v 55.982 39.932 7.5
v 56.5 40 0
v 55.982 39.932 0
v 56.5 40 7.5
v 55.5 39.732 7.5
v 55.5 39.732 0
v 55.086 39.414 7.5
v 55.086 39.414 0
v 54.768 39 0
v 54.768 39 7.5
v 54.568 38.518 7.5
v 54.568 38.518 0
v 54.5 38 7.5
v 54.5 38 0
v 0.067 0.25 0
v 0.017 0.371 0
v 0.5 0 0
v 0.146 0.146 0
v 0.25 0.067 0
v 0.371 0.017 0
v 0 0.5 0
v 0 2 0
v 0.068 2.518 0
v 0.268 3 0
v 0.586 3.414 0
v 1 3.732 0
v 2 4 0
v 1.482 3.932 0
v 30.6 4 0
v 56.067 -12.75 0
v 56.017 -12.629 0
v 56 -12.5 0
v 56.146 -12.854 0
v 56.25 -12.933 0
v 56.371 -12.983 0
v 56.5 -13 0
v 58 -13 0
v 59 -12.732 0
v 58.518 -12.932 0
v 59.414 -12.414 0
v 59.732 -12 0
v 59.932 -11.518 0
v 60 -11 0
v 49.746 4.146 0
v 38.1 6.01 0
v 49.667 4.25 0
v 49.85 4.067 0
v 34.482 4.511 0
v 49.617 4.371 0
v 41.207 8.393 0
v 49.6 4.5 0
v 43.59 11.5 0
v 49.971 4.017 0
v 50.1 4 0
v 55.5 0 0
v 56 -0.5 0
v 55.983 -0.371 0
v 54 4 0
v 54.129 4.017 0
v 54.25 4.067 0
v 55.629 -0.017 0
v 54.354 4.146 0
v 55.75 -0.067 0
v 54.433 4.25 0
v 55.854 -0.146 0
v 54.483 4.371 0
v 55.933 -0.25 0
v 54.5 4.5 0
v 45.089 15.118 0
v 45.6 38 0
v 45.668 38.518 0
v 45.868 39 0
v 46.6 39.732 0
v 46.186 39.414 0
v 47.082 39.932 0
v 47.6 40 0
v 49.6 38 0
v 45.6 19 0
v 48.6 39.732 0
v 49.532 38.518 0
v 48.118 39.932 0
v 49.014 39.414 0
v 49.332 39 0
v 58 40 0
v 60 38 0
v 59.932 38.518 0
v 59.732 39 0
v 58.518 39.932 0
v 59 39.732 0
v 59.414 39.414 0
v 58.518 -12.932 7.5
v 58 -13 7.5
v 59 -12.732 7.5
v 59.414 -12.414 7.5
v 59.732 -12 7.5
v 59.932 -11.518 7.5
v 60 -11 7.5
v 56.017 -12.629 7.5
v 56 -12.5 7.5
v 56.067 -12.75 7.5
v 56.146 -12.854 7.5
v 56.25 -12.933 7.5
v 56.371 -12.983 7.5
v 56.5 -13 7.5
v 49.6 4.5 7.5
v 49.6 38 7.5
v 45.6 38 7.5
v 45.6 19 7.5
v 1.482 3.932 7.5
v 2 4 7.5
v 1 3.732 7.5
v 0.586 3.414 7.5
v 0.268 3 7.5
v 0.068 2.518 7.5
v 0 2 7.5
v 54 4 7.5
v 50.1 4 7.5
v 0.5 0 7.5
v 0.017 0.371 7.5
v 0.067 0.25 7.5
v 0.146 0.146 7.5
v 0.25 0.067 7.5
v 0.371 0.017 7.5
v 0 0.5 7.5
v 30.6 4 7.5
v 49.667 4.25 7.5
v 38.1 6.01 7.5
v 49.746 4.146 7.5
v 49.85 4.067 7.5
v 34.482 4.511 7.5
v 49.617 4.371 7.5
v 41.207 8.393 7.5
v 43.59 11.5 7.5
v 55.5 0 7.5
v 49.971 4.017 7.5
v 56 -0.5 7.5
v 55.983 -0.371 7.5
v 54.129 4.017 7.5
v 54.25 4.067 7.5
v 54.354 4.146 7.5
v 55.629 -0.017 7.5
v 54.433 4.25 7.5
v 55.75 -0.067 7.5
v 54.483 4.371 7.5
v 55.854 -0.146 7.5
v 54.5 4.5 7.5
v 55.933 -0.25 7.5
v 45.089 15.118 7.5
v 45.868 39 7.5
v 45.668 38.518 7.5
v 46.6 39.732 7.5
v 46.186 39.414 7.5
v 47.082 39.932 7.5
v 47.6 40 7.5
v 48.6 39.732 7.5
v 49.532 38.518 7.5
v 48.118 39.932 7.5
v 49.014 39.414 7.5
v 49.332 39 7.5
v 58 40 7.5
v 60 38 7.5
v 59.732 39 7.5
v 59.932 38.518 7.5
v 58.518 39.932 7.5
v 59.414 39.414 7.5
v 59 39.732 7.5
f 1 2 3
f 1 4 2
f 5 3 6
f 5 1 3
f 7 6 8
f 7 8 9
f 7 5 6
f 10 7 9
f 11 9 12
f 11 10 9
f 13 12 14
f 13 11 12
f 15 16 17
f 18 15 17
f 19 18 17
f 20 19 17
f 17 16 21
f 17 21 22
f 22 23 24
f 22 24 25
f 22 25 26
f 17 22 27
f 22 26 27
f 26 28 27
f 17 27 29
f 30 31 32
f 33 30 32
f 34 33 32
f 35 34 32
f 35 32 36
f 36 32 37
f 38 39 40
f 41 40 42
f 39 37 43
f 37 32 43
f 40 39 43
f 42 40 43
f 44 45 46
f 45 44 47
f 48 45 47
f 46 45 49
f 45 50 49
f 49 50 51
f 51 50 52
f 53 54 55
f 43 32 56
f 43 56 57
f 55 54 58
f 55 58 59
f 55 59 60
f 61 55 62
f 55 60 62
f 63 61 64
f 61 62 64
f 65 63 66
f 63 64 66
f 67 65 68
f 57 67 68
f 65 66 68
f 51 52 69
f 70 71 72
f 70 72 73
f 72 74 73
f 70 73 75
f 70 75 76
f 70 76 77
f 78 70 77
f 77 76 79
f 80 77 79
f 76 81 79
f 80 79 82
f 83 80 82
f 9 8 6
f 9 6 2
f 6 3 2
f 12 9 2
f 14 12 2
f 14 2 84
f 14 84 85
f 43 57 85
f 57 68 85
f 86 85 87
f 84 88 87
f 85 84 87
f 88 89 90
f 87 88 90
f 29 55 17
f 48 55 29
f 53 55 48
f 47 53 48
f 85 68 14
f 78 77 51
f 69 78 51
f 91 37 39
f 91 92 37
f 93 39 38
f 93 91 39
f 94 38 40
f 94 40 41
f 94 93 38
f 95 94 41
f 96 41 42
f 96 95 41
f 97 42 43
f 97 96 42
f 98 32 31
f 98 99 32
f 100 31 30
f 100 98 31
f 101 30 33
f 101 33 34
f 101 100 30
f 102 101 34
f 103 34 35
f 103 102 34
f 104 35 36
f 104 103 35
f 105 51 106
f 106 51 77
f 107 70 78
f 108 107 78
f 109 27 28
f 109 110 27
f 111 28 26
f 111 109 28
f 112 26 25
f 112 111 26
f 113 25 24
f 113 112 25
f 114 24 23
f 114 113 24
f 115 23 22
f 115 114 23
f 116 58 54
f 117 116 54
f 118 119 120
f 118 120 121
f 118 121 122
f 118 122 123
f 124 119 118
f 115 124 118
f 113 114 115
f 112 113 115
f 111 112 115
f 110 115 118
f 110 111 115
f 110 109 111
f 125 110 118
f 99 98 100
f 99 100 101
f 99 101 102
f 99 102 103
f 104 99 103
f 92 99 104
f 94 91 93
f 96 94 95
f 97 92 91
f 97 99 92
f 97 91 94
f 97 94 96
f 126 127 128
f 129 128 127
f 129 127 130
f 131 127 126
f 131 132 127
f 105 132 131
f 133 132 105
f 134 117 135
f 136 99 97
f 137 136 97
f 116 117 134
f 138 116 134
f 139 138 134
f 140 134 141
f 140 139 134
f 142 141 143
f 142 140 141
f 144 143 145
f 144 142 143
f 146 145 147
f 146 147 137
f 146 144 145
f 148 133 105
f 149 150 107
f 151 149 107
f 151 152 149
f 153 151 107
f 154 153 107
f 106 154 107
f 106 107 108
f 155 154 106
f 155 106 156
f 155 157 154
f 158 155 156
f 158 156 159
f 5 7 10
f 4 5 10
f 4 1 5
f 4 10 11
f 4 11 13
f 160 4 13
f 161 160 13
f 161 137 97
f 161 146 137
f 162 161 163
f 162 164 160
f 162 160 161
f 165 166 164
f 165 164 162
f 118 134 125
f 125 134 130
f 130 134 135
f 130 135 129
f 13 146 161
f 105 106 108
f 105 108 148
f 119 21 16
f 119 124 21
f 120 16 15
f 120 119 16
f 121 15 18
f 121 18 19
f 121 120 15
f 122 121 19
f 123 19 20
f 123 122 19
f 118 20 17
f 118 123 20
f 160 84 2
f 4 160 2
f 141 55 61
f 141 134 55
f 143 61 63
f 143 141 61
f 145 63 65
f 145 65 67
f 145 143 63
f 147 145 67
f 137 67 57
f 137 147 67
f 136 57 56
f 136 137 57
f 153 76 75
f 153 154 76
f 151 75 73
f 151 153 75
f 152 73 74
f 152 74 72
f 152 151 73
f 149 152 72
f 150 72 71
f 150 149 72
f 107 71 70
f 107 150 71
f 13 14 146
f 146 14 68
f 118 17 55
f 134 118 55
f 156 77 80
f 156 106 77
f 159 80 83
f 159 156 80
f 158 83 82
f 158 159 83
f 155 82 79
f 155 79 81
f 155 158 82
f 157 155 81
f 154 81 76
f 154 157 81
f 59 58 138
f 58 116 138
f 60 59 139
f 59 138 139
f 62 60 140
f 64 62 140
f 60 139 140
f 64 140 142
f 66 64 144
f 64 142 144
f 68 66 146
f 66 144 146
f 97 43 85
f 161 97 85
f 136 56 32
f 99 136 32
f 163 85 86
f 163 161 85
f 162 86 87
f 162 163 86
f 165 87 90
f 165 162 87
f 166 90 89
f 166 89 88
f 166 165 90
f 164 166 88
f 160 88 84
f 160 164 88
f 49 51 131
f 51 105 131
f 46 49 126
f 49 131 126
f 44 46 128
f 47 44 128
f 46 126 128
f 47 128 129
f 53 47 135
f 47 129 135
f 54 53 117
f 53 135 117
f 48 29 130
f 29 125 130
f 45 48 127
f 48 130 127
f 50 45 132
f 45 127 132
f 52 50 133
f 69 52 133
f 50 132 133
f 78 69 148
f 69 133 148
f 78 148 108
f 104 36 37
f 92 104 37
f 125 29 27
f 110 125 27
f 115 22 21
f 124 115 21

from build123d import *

# Parameters (mm, degrees)
F1_DEPTH = 7.5
F2_R     = 1.99999
F3_R     = 15
F4_R     = 0.5


# Not quite as in the source:
# - a fillet or chamfer is up to 0.001 mm smaller than in the source, because OpenCascade refuses the exact size


with BuildPart() as f1:
    # F0 (on Top) → F1 (new body)
    with BuildSketch(Plane.XY):
        Polygon((45.6, 4), (0, 4), (0, 0), (56, 0), (56, -13), (60, -13), (60, 40), (54.5, 40), (54.5, 4), (49.6, 4), (49.6, 40), (45.6, 40), align=None)
    extrude(amount=F1_DEPTH)

    # F2 (radius 2 in the source; OpenCascade refuses exactly that, so slightly less here)
    f2_edges = [f1.edges().sort_by_distance(p)[0] for p in [
        (60, -13, 3.75),
        (60, 40, 3.75),
        (54.5, 40, 3.75),
        (49.6, 40, 3.75),
        (45.6, 40, 3.75),
        (0, 4, 3.75),
    ]]
    fillet(f2_edges, radius=F2_R)

    # F3
    f3_edges = [f1.edges().sort_by_distance(p)[0] for p in [
        (45.6, 4, 3.75),
    ]]
    fillet(f3_edges, radius=F3_R)

    # F4
    f4_edges = [f1.edges().sort_by_distance(p)[0] for p in [
        (49.6, 4, 3.75),
        (54.5, 4, 3.75),
        (0, 0, 3.75),
        (56, -13, 3.75),
        (56, 0, 3.75),
    ]]
    fillet(f4_edges, radius=F4_R)


solid = f1.part
